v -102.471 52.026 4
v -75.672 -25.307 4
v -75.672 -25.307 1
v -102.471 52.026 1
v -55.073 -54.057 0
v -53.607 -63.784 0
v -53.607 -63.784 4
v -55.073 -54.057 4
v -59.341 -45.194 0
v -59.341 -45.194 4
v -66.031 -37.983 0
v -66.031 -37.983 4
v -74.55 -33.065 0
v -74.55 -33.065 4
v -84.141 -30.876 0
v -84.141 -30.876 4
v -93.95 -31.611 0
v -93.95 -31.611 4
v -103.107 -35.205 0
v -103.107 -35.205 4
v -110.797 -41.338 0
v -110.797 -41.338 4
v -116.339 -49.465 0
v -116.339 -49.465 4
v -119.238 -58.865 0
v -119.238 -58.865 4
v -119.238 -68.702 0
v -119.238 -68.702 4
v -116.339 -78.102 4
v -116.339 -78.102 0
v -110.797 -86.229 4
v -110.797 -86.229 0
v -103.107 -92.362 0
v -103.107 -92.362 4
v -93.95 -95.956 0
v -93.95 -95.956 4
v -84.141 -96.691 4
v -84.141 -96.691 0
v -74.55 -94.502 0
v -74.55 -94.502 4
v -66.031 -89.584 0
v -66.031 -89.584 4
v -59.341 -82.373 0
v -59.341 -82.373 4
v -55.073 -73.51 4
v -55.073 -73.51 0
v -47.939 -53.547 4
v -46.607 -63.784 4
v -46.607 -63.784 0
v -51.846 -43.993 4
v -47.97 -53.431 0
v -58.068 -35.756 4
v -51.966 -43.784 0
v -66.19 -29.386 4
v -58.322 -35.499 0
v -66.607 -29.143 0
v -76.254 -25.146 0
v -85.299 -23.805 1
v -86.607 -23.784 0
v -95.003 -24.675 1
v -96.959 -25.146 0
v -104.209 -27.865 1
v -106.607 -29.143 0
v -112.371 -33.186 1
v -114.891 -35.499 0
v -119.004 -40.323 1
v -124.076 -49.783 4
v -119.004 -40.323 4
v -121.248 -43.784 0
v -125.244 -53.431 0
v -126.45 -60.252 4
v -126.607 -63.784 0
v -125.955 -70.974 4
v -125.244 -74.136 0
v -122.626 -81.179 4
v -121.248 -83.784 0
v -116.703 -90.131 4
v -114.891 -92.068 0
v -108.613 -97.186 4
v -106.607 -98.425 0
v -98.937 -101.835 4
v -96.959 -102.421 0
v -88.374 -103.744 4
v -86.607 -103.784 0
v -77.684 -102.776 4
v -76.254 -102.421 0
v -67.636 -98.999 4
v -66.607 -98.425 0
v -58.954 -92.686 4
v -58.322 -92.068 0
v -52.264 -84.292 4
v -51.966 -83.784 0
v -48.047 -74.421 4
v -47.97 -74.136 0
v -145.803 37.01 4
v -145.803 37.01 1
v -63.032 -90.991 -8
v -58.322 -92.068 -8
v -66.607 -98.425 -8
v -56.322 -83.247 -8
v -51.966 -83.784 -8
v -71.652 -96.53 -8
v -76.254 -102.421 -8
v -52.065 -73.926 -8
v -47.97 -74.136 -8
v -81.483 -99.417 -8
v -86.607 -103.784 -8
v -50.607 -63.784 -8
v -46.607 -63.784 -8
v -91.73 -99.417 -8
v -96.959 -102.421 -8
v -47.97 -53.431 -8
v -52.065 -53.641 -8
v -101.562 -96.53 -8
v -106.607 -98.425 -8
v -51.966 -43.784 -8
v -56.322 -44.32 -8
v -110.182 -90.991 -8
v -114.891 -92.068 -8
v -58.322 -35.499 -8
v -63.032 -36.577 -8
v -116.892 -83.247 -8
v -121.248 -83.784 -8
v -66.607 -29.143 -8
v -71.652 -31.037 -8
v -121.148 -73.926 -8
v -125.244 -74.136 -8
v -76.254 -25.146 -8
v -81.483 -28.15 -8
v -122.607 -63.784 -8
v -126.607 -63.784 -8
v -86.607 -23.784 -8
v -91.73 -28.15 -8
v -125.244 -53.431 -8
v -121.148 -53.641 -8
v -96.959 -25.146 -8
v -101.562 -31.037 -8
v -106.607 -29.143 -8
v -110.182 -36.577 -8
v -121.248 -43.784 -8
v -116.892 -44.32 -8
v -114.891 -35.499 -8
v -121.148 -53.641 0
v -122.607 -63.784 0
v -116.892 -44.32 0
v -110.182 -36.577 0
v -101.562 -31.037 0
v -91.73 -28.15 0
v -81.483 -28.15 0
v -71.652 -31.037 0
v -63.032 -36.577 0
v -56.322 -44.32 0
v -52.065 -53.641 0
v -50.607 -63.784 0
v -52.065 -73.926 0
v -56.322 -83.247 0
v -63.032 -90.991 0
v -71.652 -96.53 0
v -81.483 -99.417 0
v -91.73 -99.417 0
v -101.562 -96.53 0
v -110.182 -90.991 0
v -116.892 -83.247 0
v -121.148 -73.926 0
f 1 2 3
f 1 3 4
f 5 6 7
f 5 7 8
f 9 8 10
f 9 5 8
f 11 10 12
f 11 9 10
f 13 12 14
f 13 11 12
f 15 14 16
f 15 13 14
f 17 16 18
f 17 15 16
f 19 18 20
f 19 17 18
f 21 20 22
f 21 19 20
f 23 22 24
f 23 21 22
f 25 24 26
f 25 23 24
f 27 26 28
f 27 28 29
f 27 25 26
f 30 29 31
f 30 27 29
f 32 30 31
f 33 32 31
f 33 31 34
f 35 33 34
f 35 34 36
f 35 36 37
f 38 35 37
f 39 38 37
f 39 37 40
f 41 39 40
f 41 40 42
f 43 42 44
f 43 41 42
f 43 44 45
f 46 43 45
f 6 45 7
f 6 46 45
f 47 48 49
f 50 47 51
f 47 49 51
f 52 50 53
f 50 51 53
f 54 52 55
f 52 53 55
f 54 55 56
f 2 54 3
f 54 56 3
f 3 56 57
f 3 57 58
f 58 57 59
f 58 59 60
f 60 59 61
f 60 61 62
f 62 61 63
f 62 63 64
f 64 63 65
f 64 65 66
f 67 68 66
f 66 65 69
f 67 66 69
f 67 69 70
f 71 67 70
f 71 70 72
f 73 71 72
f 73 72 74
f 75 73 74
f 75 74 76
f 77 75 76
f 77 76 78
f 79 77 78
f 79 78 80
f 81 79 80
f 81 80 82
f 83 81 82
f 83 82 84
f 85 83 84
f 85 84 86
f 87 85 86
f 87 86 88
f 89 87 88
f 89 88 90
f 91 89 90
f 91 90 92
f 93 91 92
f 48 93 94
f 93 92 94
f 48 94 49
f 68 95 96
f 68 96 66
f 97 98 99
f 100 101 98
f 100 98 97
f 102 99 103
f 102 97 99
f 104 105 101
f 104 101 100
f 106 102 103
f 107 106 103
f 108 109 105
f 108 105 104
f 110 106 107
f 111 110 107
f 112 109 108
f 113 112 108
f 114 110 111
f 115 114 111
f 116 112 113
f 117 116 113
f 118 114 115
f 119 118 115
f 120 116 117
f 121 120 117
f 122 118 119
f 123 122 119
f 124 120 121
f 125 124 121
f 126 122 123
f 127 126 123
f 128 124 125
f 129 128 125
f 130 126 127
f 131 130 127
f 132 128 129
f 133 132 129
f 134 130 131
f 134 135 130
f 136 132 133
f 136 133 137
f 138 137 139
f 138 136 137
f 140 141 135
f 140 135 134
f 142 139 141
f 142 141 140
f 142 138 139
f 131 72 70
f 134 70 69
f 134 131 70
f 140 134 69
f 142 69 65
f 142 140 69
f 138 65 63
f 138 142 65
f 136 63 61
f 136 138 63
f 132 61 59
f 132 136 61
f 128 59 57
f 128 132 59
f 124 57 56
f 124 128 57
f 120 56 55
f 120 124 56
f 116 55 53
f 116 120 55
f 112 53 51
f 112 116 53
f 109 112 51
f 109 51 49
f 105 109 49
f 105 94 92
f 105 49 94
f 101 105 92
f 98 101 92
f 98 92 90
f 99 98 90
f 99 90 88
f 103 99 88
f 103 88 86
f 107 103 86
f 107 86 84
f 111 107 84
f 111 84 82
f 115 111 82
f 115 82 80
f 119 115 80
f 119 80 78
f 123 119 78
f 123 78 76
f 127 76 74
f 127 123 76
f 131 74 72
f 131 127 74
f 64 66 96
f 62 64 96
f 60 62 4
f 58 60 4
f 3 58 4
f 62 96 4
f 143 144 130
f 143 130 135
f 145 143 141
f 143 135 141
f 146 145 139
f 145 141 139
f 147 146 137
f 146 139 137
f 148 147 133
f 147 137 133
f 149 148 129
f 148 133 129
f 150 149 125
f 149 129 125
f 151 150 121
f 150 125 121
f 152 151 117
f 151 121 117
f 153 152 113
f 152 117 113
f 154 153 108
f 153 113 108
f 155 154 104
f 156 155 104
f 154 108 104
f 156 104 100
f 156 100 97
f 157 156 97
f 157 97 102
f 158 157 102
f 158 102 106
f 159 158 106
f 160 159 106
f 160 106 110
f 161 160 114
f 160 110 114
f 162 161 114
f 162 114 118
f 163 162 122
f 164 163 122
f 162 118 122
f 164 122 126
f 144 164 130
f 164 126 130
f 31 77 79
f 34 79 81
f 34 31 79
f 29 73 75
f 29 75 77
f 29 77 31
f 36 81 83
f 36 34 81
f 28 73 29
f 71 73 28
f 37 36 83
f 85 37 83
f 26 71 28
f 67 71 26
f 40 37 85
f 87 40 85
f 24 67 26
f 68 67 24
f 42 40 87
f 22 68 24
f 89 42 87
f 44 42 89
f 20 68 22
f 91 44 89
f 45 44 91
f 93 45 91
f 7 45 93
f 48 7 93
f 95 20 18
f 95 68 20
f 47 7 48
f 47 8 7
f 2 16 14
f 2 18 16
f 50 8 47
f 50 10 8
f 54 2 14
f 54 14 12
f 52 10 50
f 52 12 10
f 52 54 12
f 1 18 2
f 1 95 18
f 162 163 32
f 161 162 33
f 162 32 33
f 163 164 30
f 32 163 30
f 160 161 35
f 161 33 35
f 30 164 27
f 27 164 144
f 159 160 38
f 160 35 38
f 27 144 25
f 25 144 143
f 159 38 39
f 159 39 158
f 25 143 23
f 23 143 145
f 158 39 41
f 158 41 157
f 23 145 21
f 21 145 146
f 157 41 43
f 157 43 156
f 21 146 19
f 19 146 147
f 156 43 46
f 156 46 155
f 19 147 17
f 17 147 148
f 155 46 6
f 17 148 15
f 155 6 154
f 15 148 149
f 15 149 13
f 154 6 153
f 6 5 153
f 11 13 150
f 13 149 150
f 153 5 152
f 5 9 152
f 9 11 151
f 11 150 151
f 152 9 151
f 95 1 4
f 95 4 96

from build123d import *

# Parameters (mm, degrees)
SKETCH_1_R      = 40
SKETCH_1_R_2    = 33
EXTRUDE_1_DEPTH = 4
EXTRUDE_START   = 8
SKETCH_2_R      = 40
SKETCH_2_R_2    = 36
EXTRUDE_2_DEPTH = 8
EXTRUDE_3_DEPTH = 3


with BuildPart() as part:
    # 草图1 → 凸台-拉伸1 (new body)
    with BuildSketch(Plane.XY):
        with Locations((-86.606649797, -63.783530386)):
            Circle(SKETCH_1_R)
        with Locations((-86.606649797, -63.783530386)):
            Circle(SKETCH_1_R_2, mode=Mode.SUBTRACT)
    extrude(amount=EXTRUDE_1_DEPTH)

    # 草图2 → 凸台-拉伸2 (add)
    with BuildSketch(Plane(origin=(0, 0, 0), x_dir=(-1, 0, 0), z_dir=(0, 0, -1)).offset(EXTRUDE_START)):
        with Locations((86.606649797, -63.783530386)):
            Circle(SKETCH_2_R)
        with Locations((86.606649797, -63.783530386)):
            Circle(SKETCH_2_R_2, mode=Mode.SUBTRACT)
    extrude(amount=-EXTRUDE_2_DEPTH)

    # 草图4 → 凸台-拉伸3 (add)
    with BuildSketch(Plane.XY.offset(4)):
        with BuildLine():
            Line((-102.470674133, 52.025849932), (-145.802574452, 37.009933401))
            Line((-145.802574452, 37.009933401), (-118.238289751, -42.533185695))
            ThreePointArc((-118.238289751, -42.533185695), (-99.084005703, -27.777233919), (-74.906389432, -27.517269163))
            Line((-74.906389432, -27.517269163), (-102.470674133, 52.025849932))
        make_face()
    extrude(amount=-EXTRUDE_3_DEPTH)


solid = part.part
